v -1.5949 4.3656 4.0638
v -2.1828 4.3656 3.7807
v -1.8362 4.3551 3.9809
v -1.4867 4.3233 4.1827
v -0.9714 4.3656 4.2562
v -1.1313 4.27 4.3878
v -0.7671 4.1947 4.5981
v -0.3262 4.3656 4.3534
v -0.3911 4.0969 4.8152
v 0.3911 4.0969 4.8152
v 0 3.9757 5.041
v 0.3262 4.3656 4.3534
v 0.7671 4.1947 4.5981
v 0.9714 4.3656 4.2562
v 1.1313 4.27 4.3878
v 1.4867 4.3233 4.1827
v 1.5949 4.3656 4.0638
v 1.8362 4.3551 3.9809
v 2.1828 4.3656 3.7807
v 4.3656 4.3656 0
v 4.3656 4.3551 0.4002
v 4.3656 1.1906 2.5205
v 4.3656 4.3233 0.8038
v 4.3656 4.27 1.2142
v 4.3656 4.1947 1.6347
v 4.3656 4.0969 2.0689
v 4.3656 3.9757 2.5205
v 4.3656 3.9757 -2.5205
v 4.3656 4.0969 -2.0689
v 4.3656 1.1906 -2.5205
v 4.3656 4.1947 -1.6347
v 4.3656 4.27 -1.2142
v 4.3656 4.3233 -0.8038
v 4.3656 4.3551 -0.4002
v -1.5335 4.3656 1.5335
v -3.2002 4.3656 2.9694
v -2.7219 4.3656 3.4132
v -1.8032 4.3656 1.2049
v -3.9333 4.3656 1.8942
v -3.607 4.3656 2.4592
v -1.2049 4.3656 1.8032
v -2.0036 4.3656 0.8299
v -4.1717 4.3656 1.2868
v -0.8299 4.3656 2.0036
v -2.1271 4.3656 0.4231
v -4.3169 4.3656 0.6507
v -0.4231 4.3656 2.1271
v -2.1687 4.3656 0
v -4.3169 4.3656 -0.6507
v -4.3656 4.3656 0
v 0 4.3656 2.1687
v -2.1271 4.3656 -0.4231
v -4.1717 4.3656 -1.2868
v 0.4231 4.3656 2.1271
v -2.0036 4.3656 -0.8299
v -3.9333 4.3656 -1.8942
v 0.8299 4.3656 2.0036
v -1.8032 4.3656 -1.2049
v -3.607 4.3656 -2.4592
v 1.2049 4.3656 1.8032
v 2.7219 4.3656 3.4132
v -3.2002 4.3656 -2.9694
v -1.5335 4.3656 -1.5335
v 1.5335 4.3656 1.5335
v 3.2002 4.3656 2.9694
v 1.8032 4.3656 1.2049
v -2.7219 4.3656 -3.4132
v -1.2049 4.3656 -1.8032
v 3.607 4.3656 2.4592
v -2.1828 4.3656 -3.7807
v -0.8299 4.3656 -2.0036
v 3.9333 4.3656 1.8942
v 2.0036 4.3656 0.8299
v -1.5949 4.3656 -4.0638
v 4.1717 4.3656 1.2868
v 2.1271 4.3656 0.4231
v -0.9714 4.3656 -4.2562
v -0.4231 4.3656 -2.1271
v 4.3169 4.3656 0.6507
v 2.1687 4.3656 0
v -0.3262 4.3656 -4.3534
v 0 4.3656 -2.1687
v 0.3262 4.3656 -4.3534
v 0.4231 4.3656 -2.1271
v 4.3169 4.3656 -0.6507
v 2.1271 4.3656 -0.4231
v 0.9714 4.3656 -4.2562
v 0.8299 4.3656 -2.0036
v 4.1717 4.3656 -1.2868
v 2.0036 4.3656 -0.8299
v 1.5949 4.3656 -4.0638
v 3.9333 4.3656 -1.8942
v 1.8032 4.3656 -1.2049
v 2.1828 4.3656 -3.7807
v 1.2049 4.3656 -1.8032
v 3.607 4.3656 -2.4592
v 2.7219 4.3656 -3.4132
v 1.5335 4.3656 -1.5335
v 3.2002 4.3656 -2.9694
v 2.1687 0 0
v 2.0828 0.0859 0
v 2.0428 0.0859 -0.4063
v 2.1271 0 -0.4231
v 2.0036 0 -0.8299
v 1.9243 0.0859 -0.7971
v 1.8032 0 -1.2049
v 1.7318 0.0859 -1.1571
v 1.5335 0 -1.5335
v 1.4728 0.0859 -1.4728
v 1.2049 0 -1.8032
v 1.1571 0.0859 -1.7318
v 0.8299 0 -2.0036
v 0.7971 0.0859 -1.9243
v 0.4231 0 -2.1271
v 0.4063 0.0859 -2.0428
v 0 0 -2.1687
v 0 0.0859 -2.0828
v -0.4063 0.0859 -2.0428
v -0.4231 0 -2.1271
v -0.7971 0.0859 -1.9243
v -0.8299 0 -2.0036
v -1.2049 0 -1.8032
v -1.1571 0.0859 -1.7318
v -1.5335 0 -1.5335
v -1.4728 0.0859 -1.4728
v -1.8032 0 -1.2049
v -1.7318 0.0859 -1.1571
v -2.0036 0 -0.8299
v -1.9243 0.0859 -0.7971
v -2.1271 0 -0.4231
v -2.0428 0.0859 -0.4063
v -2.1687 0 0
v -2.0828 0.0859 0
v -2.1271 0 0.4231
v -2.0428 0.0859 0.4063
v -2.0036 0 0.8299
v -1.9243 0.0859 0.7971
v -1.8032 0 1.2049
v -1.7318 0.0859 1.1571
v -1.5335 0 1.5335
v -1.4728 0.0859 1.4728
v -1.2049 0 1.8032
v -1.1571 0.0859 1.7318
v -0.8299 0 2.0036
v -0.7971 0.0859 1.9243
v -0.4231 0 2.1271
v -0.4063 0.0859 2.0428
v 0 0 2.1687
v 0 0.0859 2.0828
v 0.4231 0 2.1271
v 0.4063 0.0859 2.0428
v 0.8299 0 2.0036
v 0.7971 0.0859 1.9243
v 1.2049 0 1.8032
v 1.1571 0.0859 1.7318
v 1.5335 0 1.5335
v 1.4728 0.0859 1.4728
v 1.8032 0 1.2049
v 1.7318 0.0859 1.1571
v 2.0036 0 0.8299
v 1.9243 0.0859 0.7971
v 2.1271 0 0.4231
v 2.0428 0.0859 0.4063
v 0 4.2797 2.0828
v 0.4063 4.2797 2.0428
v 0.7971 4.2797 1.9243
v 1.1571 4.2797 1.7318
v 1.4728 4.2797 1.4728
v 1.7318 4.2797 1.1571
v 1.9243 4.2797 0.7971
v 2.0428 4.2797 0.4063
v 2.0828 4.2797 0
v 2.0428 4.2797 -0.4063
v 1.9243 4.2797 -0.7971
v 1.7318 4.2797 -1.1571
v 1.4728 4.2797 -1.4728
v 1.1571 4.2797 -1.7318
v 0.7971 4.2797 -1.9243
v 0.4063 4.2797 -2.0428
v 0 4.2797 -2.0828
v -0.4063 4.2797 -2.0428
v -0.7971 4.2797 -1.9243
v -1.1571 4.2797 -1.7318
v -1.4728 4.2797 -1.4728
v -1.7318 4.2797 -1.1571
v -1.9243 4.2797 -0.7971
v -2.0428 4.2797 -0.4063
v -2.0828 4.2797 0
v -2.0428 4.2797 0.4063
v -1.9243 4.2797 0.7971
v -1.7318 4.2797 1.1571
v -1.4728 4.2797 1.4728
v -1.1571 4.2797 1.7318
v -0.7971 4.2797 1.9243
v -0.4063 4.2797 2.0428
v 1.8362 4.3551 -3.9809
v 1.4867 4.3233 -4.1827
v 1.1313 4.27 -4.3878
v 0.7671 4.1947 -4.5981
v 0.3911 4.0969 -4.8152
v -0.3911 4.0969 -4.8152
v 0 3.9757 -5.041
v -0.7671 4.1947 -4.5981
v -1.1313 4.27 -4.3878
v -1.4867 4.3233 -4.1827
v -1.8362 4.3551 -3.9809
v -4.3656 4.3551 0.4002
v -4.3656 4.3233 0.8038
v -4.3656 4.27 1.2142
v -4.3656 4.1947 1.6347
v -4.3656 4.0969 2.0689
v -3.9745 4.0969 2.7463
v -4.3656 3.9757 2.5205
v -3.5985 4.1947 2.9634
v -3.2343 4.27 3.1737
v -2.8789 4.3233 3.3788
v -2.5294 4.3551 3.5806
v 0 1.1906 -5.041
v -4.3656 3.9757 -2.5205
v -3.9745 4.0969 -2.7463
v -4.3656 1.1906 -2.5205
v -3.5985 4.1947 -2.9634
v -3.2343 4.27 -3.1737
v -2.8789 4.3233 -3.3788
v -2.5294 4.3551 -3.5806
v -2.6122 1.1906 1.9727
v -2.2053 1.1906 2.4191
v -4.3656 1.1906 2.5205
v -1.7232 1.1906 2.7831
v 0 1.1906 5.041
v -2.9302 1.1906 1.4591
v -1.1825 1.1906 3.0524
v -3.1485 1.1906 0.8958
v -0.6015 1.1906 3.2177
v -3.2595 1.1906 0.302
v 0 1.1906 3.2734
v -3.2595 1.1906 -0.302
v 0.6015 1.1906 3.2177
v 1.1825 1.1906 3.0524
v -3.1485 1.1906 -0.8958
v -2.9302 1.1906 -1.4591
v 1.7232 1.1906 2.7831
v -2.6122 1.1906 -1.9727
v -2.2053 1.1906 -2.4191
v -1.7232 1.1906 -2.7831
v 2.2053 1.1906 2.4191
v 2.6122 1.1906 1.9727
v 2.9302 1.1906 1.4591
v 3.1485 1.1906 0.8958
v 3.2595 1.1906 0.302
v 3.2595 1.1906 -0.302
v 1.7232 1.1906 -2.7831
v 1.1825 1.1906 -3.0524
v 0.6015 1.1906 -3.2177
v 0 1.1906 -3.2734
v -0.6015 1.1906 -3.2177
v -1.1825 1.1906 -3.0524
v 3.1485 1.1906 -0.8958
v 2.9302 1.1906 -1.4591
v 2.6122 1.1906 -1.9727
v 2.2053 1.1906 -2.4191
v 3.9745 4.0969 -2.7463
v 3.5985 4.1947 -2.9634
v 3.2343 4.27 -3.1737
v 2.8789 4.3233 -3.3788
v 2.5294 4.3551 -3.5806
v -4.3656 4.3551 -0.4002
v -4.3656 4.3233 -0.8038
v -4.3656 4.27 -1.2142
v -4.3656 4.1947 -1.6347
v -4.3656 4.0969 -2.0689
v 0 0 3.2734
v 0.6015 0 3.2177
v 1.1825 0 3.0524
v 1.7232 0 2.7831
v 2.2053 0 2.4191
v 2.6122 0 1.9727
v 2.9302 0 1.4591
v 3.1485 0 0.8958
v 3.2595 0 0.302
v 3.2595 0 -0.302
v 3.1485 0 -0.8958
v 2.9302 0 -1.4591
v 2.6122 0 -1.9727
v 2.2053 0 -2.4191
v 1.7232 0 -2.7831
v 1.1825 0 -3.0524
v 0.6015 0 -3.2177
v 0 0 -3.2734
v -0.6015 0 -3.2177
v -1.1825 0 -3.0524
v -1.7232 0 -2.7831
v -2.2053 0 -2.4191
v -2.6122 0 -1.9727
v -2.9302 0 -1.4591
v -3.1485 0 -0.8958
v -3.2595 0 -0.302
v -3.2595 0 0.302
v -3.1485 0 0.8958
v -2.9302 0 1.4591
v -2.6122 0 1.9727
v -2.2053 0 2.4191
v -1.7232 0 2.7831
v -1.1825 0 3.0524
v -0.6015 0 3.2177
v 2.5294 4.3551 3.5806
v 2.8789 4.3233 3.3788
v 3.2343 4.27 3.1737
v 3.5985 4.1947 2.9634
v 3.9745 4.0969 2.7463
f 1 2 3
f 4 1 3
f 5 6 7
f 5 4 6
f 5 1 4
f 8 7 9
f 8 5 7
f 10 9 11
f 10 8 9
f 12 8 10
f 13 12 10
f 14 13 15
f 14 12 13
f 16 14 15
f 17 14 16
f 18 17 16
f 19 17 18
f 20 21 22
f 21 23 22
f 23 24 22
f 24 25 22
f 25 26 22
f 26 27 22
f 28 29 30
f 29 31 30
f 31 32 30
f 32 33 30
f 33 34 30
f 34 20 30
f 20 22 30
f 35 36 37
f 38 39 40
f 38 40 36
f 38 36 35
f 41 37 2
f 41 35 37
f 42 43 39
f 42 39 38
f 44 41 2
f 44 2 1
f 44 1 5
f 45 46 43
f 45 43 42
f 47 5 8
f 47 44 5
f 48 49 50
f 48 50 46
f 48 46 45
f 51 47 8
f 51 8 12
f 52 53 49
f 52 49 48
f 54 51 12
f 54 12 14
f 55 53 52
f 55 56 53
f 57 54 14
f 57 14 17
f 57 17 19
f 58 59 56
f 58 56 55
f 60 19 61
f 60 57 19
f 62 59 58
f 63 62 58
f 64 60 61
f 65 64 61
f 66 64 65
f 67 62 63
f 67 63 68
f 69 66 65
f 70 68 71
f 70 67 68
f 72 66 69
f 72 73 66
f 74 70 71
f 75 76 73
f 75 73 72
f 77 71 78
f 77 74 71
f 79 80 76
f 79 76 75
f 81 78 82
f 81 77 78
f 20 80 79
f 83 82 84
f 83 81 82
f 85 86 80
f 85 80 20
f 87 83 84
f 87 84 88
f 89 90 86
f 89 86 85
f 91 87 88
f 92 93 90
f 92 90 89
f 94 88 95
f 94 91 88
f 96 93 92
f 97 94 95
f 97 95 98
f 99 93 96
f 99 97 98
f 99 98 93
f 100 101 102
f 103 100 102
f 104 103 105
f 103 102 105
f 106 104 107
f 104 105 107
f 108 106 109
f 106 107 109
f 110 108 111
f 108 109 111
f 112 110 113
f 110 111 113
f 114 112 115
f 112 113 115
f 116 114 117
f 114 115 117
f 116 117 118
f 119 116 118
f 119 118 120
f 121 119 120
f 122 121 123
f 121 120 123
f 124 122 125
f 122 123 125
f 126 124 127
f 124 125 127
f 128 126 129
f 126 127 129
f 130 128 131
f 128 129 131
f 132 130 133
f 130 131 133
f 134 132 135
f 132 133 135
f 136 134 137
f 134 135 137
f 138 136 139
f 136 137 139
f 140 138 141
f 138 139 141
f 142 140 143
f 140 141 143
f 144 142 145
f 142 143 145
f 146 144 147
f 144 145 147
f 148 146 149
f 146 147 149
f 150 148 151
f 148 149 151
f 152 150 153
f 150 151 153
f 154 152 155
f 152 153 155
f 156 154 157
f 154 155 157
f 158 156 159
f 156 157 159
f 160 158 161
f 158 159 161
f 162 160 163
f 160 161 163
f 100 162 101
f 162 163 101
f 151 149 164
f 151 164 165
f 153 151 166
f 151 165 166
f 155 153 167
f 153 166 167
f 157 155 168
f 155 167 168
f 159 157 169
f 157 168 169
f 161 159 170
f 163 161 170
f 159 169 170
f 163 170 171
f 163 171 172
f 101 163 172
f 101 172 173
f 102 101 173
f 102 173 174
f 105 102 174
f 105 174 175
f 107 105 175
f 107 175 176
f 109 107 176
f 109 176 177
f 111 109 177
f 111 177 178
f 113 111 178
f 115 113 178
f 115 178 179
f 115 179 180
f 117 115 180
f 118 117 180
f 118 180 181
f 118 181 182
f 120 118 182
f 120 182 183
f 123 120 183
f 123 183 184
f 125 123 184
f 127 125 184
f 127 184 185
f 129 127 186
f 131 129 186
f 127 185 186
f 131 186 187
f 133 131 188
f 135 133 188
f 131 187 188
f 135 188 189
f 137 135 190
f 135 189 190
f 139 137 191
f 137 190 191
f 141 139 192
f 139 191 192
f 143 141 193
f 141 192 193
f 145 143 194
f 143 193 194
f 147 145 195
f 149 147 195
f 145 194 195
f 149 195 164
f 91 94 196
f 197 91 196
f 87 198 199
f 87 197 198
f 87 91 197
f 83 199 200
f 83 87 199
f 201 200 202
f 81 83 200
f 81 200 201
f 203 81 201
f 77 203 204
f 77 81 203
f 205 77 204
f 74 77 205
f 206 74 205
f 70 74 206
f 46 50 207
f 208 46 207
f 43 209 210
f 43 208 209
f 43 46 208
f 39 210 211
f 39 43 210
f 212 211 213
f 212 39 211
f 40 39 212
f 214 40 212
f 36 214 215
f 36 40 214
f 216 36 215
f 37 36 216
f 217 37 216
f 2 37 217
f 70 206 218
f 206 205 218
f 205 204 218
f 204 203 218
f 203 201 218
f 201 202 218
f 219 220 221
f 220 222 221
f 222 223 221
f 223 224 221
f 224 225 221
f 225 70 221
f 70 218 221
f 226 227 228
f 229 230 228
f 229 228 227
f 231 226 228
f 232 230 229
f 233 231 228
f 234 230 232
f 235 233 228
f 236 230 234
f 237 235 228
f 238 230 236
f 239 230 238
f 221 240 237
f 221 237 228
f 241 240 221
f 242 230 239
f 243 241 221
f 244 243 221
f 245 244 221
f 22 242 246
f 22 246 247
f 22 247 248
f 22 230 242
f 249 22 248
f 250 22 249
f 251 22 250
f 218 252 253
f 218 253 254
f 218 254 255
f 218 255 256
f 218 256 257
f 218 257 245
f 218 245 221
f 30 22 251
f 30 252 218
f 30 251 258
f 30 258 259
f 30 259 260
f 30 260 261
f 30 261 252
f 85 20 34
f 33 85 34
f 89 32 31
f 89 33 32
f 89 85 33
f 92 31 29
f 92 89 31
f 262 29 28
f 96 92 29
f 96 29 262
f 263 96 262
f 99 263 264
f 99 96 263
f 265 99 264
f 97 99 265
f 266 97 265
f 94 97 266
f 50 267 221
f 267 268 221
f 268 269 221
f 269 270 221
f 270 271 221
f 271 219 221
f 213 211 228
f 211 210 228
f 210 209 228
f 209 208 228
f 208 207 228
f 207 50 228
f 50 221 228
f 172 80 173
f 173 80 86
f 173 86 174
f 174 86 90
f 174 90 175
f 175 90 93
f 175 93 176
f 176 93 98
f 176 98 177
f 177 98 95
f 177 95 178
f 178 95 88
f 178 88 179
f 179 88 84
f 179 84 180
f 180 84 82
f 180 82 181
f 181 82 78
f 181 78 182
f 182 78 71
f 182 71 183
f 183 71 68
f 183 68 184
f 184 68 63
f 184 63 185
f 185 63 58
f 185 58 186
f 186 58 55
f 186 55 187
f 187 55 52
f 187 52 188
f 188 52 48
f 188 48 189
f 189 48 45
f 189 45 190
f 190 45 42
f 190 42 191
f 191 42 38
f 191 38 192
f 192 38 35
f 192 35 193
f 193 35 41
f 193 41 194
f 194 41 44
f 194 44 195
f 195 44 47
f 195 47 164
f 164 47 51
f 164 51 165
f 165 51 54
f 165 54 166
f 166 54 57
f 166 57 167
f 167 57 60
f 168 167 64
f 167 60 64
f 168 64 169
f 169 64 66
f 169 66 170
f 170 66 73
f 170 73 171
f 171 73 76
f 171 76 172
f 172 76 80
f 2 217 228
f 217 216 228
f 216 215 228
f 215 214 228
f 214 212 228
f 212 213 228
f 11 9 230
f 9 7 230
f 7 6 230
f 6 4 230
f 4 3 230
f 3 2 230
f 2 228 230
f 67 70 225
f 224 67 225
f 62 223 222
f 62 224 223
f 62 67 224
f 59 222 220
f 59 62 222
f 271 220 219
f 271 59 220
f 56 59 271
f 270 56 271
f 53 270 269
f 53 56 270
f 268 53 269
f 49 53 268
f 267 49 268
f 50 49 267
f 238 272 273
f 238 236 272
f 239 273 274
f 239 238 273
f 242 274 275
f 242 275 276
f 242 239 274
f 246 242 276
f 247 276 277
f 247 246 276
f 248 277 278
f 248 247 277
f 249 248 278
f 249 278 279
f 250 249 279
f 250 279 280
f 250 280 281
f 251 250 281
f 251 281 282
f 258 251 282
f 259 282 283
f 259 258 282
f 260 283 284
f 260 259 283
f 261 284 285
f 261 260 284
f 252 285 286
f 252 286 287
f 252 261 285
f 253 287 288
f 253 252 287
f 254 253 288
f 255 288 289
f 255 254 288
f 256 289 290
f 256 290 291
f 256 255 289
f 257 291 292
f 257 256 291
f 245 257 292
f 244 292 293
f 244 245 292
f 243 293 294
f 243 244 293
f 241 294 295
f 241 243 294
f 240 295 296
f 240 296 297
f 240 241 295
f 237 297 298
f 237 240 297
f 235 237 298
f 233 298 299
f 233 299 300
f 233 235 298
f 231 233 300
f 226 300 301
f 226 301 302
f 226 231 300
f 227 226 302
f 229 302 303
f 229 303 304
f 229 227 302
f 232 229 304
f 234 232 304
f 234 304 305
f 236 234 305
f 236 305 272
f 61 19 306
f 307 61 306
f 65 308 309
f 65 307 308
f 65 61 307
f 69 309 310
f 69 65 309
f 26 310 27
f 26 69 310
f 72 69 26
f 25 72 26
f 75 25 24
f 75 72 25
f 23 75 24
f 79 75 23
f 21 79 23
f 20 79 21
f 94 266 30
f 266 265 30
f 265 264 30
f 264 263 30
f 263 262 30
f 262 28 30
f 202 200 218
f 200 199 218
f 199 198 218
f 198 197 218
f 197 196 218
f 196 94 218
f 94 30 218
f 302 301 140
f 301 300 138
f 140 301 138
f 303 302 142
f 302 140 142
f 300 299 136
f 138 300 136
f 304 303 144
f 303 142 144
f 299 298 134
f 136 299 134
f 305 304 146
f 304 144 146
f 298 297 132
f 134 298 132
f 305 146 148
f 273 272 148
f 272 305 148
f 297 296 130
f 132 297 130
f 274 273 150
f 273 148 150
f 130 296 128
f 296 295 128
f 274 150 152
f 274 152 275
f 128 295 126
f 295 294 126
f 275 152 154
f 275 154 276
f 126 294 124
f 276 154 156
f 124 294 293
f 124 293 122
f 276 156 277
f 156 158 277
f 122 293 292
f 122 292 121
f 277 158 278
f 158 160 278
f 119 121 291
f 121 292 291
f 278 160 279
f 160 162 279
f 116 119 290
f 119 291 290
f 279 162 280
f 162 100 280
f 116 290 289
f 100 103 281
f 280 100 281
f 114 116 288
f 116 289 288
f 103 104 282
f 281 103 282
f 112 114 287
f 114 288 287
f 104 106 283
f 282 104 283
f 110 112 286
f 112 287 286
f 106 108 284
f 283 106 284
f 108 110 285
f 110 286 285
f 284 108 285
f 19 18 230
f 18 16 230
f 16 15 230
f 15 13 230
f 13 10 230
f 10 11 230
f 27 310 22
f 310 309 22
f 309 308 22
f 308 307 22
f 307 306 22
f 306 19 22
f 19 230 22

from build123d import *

# Parameters (mm, degrees)
BOSS_EXTRUDE1_DEPTH = 4.365625
SKETCH2_OUTSIDE_W   = 44.614
SKETCH2_OUTSIDE_H   = 45.964
SKETCH2_OUTSIDE_R   = 4.365625
CUT_EXTRUDE1_DEPTH  = 8.9705043
CUT_EXTRUDE1_DRAFT  = -60
SKETCH4_R           = 2.0828
CUT_EXTRUDE3_DEPTH  = 4.365625
SKETCH9_W           = 1.767564538
SKETCH9_H           = 1.190625


# Read off the part's stored shape, not the designer's step: Cut-Extrude4, Cut-Extrude5
with BuildPart() as part:
    # Sketch1 → Boss-Extrude1 (new body)
    with BuildSketch(Plane(origin=(0, 0, 0), x_dir=(1, 0, 0), z_dir=(0, 1, 0))):
        Polygon((0, 5.040989538), (-4.365625, 2.520494769), (-4.365625, -2.520494769), (0, -5.040989538), (4.365625, -2.520494769), (4.365625, 2.520494769), align=None)
    extrude(amount=BOSS_EXTRUDE1_DEPTH)


with BuildPart() as cut_extrude1_tool:
    # Sketch2 outside → Cut-Extrude1 (with draft: the straight prism first)
    with BuildSketch(Plane(origin=(0, 4.365625, 0), x_dir=(1, 0, 0), z_dir=(0, 1, 0))):
        Rectangle(SKETCH2_OUTSIDE_W, SKETCH2_OUTSIDE_H)
        Circle(SKETCH2_OUTSIDE_R, mode=Mode.SUBTRACT)
    extrude(amount=-CUT_EXTRUDE1_DEPTH)
    # Cut-Extrude1: the draft: its side faces are tilted about the plane it starts from
    cut_extrude1_sides = [cut_extrude1_tool.faces().sort_by_distance(p)[0] for p in [
        (0, -0.11962715, 22.982),
        (22.307, -0.11962715, 0),
        (0, -0.11962715, -22.982),
        (-22.307, -0.11962715, 0),
        (-4.365625, -0.11962715, 0),
    ]]
    draft(cut_extrude1_sides, Plane(origin=(0, 4.365625, 0), x_dir=(1, 0, 0), z_dir=(0, 1, 0)), CUT_EXTRUDE1_DRAFT)


with BuildPart() as part_1:
    add(part.part)

    # Cut-Extrude1: cut by cut_extrude1_tool
    add(cut_extrude1_tool.part, mode=Mode.SUBTRACT)

    # Sketch4 → Cut-Extrude3 (cut)
    with BuildSketch(Plane(origin=(0, 4.365625, 0), x_dir=(1, 0, 0), z_dir=(0, 1, 0))):
        with Locations(Location((0, 0, 0), (0, 0, 270))):
            Circle(SKETCH4_R)
    extrude(amount=-CUT_EXTRUDE3_DEPTH, mode=Mode.SUBTRACT)

    # Cut-Extrude4 outline → Cut-Extrude4 (revolve, cut)
    with BuildSketch(Plane.XY):
        Polygon((2.0828, 4.365625), (2.0828, 4.279699042), (2.168725958, 4.365625), align=None)
    revolve(axis=Axis((0, 0, 0), (0, 1, 0)), mode=Mode.SUBTRACT)

    # Cut-Extrude5 outline → Cut-Extrude5 (revolve, cut)
    with BuildSketch(Plane.XY):
        Polygon((2.168725958, 0), (2.0828, 0.085925958), (2.0828, 0), align=None)
    revolve(axis=Axis((0, 0, 0), (0, 1, 0)), mode=Mode.SUBTRACT)

    # Sketch9 → Cut-Revolve1 (revolve, cut)
    with BuildSketch(Plane(origin=(0, 0, 0), x_dir=(0, 0, -1), z_dir=(1, 0, 0)), mode=Mode.PRIVATE) as cut_revolve1_sk:
        with Locations((4.157207269, 0.5953125)):
            Rectangle(SKETCH9_W, SKETCH9_H)
    revolve(cut_revolve1_sk.sketch.rotate(Axis((0, 0, 0), (0, 1, 0)), 180), axis=Axis((0, 0, 0), (0, 1, 0)), mode=Mode.SUBTRACT)


solid = part_1.part
